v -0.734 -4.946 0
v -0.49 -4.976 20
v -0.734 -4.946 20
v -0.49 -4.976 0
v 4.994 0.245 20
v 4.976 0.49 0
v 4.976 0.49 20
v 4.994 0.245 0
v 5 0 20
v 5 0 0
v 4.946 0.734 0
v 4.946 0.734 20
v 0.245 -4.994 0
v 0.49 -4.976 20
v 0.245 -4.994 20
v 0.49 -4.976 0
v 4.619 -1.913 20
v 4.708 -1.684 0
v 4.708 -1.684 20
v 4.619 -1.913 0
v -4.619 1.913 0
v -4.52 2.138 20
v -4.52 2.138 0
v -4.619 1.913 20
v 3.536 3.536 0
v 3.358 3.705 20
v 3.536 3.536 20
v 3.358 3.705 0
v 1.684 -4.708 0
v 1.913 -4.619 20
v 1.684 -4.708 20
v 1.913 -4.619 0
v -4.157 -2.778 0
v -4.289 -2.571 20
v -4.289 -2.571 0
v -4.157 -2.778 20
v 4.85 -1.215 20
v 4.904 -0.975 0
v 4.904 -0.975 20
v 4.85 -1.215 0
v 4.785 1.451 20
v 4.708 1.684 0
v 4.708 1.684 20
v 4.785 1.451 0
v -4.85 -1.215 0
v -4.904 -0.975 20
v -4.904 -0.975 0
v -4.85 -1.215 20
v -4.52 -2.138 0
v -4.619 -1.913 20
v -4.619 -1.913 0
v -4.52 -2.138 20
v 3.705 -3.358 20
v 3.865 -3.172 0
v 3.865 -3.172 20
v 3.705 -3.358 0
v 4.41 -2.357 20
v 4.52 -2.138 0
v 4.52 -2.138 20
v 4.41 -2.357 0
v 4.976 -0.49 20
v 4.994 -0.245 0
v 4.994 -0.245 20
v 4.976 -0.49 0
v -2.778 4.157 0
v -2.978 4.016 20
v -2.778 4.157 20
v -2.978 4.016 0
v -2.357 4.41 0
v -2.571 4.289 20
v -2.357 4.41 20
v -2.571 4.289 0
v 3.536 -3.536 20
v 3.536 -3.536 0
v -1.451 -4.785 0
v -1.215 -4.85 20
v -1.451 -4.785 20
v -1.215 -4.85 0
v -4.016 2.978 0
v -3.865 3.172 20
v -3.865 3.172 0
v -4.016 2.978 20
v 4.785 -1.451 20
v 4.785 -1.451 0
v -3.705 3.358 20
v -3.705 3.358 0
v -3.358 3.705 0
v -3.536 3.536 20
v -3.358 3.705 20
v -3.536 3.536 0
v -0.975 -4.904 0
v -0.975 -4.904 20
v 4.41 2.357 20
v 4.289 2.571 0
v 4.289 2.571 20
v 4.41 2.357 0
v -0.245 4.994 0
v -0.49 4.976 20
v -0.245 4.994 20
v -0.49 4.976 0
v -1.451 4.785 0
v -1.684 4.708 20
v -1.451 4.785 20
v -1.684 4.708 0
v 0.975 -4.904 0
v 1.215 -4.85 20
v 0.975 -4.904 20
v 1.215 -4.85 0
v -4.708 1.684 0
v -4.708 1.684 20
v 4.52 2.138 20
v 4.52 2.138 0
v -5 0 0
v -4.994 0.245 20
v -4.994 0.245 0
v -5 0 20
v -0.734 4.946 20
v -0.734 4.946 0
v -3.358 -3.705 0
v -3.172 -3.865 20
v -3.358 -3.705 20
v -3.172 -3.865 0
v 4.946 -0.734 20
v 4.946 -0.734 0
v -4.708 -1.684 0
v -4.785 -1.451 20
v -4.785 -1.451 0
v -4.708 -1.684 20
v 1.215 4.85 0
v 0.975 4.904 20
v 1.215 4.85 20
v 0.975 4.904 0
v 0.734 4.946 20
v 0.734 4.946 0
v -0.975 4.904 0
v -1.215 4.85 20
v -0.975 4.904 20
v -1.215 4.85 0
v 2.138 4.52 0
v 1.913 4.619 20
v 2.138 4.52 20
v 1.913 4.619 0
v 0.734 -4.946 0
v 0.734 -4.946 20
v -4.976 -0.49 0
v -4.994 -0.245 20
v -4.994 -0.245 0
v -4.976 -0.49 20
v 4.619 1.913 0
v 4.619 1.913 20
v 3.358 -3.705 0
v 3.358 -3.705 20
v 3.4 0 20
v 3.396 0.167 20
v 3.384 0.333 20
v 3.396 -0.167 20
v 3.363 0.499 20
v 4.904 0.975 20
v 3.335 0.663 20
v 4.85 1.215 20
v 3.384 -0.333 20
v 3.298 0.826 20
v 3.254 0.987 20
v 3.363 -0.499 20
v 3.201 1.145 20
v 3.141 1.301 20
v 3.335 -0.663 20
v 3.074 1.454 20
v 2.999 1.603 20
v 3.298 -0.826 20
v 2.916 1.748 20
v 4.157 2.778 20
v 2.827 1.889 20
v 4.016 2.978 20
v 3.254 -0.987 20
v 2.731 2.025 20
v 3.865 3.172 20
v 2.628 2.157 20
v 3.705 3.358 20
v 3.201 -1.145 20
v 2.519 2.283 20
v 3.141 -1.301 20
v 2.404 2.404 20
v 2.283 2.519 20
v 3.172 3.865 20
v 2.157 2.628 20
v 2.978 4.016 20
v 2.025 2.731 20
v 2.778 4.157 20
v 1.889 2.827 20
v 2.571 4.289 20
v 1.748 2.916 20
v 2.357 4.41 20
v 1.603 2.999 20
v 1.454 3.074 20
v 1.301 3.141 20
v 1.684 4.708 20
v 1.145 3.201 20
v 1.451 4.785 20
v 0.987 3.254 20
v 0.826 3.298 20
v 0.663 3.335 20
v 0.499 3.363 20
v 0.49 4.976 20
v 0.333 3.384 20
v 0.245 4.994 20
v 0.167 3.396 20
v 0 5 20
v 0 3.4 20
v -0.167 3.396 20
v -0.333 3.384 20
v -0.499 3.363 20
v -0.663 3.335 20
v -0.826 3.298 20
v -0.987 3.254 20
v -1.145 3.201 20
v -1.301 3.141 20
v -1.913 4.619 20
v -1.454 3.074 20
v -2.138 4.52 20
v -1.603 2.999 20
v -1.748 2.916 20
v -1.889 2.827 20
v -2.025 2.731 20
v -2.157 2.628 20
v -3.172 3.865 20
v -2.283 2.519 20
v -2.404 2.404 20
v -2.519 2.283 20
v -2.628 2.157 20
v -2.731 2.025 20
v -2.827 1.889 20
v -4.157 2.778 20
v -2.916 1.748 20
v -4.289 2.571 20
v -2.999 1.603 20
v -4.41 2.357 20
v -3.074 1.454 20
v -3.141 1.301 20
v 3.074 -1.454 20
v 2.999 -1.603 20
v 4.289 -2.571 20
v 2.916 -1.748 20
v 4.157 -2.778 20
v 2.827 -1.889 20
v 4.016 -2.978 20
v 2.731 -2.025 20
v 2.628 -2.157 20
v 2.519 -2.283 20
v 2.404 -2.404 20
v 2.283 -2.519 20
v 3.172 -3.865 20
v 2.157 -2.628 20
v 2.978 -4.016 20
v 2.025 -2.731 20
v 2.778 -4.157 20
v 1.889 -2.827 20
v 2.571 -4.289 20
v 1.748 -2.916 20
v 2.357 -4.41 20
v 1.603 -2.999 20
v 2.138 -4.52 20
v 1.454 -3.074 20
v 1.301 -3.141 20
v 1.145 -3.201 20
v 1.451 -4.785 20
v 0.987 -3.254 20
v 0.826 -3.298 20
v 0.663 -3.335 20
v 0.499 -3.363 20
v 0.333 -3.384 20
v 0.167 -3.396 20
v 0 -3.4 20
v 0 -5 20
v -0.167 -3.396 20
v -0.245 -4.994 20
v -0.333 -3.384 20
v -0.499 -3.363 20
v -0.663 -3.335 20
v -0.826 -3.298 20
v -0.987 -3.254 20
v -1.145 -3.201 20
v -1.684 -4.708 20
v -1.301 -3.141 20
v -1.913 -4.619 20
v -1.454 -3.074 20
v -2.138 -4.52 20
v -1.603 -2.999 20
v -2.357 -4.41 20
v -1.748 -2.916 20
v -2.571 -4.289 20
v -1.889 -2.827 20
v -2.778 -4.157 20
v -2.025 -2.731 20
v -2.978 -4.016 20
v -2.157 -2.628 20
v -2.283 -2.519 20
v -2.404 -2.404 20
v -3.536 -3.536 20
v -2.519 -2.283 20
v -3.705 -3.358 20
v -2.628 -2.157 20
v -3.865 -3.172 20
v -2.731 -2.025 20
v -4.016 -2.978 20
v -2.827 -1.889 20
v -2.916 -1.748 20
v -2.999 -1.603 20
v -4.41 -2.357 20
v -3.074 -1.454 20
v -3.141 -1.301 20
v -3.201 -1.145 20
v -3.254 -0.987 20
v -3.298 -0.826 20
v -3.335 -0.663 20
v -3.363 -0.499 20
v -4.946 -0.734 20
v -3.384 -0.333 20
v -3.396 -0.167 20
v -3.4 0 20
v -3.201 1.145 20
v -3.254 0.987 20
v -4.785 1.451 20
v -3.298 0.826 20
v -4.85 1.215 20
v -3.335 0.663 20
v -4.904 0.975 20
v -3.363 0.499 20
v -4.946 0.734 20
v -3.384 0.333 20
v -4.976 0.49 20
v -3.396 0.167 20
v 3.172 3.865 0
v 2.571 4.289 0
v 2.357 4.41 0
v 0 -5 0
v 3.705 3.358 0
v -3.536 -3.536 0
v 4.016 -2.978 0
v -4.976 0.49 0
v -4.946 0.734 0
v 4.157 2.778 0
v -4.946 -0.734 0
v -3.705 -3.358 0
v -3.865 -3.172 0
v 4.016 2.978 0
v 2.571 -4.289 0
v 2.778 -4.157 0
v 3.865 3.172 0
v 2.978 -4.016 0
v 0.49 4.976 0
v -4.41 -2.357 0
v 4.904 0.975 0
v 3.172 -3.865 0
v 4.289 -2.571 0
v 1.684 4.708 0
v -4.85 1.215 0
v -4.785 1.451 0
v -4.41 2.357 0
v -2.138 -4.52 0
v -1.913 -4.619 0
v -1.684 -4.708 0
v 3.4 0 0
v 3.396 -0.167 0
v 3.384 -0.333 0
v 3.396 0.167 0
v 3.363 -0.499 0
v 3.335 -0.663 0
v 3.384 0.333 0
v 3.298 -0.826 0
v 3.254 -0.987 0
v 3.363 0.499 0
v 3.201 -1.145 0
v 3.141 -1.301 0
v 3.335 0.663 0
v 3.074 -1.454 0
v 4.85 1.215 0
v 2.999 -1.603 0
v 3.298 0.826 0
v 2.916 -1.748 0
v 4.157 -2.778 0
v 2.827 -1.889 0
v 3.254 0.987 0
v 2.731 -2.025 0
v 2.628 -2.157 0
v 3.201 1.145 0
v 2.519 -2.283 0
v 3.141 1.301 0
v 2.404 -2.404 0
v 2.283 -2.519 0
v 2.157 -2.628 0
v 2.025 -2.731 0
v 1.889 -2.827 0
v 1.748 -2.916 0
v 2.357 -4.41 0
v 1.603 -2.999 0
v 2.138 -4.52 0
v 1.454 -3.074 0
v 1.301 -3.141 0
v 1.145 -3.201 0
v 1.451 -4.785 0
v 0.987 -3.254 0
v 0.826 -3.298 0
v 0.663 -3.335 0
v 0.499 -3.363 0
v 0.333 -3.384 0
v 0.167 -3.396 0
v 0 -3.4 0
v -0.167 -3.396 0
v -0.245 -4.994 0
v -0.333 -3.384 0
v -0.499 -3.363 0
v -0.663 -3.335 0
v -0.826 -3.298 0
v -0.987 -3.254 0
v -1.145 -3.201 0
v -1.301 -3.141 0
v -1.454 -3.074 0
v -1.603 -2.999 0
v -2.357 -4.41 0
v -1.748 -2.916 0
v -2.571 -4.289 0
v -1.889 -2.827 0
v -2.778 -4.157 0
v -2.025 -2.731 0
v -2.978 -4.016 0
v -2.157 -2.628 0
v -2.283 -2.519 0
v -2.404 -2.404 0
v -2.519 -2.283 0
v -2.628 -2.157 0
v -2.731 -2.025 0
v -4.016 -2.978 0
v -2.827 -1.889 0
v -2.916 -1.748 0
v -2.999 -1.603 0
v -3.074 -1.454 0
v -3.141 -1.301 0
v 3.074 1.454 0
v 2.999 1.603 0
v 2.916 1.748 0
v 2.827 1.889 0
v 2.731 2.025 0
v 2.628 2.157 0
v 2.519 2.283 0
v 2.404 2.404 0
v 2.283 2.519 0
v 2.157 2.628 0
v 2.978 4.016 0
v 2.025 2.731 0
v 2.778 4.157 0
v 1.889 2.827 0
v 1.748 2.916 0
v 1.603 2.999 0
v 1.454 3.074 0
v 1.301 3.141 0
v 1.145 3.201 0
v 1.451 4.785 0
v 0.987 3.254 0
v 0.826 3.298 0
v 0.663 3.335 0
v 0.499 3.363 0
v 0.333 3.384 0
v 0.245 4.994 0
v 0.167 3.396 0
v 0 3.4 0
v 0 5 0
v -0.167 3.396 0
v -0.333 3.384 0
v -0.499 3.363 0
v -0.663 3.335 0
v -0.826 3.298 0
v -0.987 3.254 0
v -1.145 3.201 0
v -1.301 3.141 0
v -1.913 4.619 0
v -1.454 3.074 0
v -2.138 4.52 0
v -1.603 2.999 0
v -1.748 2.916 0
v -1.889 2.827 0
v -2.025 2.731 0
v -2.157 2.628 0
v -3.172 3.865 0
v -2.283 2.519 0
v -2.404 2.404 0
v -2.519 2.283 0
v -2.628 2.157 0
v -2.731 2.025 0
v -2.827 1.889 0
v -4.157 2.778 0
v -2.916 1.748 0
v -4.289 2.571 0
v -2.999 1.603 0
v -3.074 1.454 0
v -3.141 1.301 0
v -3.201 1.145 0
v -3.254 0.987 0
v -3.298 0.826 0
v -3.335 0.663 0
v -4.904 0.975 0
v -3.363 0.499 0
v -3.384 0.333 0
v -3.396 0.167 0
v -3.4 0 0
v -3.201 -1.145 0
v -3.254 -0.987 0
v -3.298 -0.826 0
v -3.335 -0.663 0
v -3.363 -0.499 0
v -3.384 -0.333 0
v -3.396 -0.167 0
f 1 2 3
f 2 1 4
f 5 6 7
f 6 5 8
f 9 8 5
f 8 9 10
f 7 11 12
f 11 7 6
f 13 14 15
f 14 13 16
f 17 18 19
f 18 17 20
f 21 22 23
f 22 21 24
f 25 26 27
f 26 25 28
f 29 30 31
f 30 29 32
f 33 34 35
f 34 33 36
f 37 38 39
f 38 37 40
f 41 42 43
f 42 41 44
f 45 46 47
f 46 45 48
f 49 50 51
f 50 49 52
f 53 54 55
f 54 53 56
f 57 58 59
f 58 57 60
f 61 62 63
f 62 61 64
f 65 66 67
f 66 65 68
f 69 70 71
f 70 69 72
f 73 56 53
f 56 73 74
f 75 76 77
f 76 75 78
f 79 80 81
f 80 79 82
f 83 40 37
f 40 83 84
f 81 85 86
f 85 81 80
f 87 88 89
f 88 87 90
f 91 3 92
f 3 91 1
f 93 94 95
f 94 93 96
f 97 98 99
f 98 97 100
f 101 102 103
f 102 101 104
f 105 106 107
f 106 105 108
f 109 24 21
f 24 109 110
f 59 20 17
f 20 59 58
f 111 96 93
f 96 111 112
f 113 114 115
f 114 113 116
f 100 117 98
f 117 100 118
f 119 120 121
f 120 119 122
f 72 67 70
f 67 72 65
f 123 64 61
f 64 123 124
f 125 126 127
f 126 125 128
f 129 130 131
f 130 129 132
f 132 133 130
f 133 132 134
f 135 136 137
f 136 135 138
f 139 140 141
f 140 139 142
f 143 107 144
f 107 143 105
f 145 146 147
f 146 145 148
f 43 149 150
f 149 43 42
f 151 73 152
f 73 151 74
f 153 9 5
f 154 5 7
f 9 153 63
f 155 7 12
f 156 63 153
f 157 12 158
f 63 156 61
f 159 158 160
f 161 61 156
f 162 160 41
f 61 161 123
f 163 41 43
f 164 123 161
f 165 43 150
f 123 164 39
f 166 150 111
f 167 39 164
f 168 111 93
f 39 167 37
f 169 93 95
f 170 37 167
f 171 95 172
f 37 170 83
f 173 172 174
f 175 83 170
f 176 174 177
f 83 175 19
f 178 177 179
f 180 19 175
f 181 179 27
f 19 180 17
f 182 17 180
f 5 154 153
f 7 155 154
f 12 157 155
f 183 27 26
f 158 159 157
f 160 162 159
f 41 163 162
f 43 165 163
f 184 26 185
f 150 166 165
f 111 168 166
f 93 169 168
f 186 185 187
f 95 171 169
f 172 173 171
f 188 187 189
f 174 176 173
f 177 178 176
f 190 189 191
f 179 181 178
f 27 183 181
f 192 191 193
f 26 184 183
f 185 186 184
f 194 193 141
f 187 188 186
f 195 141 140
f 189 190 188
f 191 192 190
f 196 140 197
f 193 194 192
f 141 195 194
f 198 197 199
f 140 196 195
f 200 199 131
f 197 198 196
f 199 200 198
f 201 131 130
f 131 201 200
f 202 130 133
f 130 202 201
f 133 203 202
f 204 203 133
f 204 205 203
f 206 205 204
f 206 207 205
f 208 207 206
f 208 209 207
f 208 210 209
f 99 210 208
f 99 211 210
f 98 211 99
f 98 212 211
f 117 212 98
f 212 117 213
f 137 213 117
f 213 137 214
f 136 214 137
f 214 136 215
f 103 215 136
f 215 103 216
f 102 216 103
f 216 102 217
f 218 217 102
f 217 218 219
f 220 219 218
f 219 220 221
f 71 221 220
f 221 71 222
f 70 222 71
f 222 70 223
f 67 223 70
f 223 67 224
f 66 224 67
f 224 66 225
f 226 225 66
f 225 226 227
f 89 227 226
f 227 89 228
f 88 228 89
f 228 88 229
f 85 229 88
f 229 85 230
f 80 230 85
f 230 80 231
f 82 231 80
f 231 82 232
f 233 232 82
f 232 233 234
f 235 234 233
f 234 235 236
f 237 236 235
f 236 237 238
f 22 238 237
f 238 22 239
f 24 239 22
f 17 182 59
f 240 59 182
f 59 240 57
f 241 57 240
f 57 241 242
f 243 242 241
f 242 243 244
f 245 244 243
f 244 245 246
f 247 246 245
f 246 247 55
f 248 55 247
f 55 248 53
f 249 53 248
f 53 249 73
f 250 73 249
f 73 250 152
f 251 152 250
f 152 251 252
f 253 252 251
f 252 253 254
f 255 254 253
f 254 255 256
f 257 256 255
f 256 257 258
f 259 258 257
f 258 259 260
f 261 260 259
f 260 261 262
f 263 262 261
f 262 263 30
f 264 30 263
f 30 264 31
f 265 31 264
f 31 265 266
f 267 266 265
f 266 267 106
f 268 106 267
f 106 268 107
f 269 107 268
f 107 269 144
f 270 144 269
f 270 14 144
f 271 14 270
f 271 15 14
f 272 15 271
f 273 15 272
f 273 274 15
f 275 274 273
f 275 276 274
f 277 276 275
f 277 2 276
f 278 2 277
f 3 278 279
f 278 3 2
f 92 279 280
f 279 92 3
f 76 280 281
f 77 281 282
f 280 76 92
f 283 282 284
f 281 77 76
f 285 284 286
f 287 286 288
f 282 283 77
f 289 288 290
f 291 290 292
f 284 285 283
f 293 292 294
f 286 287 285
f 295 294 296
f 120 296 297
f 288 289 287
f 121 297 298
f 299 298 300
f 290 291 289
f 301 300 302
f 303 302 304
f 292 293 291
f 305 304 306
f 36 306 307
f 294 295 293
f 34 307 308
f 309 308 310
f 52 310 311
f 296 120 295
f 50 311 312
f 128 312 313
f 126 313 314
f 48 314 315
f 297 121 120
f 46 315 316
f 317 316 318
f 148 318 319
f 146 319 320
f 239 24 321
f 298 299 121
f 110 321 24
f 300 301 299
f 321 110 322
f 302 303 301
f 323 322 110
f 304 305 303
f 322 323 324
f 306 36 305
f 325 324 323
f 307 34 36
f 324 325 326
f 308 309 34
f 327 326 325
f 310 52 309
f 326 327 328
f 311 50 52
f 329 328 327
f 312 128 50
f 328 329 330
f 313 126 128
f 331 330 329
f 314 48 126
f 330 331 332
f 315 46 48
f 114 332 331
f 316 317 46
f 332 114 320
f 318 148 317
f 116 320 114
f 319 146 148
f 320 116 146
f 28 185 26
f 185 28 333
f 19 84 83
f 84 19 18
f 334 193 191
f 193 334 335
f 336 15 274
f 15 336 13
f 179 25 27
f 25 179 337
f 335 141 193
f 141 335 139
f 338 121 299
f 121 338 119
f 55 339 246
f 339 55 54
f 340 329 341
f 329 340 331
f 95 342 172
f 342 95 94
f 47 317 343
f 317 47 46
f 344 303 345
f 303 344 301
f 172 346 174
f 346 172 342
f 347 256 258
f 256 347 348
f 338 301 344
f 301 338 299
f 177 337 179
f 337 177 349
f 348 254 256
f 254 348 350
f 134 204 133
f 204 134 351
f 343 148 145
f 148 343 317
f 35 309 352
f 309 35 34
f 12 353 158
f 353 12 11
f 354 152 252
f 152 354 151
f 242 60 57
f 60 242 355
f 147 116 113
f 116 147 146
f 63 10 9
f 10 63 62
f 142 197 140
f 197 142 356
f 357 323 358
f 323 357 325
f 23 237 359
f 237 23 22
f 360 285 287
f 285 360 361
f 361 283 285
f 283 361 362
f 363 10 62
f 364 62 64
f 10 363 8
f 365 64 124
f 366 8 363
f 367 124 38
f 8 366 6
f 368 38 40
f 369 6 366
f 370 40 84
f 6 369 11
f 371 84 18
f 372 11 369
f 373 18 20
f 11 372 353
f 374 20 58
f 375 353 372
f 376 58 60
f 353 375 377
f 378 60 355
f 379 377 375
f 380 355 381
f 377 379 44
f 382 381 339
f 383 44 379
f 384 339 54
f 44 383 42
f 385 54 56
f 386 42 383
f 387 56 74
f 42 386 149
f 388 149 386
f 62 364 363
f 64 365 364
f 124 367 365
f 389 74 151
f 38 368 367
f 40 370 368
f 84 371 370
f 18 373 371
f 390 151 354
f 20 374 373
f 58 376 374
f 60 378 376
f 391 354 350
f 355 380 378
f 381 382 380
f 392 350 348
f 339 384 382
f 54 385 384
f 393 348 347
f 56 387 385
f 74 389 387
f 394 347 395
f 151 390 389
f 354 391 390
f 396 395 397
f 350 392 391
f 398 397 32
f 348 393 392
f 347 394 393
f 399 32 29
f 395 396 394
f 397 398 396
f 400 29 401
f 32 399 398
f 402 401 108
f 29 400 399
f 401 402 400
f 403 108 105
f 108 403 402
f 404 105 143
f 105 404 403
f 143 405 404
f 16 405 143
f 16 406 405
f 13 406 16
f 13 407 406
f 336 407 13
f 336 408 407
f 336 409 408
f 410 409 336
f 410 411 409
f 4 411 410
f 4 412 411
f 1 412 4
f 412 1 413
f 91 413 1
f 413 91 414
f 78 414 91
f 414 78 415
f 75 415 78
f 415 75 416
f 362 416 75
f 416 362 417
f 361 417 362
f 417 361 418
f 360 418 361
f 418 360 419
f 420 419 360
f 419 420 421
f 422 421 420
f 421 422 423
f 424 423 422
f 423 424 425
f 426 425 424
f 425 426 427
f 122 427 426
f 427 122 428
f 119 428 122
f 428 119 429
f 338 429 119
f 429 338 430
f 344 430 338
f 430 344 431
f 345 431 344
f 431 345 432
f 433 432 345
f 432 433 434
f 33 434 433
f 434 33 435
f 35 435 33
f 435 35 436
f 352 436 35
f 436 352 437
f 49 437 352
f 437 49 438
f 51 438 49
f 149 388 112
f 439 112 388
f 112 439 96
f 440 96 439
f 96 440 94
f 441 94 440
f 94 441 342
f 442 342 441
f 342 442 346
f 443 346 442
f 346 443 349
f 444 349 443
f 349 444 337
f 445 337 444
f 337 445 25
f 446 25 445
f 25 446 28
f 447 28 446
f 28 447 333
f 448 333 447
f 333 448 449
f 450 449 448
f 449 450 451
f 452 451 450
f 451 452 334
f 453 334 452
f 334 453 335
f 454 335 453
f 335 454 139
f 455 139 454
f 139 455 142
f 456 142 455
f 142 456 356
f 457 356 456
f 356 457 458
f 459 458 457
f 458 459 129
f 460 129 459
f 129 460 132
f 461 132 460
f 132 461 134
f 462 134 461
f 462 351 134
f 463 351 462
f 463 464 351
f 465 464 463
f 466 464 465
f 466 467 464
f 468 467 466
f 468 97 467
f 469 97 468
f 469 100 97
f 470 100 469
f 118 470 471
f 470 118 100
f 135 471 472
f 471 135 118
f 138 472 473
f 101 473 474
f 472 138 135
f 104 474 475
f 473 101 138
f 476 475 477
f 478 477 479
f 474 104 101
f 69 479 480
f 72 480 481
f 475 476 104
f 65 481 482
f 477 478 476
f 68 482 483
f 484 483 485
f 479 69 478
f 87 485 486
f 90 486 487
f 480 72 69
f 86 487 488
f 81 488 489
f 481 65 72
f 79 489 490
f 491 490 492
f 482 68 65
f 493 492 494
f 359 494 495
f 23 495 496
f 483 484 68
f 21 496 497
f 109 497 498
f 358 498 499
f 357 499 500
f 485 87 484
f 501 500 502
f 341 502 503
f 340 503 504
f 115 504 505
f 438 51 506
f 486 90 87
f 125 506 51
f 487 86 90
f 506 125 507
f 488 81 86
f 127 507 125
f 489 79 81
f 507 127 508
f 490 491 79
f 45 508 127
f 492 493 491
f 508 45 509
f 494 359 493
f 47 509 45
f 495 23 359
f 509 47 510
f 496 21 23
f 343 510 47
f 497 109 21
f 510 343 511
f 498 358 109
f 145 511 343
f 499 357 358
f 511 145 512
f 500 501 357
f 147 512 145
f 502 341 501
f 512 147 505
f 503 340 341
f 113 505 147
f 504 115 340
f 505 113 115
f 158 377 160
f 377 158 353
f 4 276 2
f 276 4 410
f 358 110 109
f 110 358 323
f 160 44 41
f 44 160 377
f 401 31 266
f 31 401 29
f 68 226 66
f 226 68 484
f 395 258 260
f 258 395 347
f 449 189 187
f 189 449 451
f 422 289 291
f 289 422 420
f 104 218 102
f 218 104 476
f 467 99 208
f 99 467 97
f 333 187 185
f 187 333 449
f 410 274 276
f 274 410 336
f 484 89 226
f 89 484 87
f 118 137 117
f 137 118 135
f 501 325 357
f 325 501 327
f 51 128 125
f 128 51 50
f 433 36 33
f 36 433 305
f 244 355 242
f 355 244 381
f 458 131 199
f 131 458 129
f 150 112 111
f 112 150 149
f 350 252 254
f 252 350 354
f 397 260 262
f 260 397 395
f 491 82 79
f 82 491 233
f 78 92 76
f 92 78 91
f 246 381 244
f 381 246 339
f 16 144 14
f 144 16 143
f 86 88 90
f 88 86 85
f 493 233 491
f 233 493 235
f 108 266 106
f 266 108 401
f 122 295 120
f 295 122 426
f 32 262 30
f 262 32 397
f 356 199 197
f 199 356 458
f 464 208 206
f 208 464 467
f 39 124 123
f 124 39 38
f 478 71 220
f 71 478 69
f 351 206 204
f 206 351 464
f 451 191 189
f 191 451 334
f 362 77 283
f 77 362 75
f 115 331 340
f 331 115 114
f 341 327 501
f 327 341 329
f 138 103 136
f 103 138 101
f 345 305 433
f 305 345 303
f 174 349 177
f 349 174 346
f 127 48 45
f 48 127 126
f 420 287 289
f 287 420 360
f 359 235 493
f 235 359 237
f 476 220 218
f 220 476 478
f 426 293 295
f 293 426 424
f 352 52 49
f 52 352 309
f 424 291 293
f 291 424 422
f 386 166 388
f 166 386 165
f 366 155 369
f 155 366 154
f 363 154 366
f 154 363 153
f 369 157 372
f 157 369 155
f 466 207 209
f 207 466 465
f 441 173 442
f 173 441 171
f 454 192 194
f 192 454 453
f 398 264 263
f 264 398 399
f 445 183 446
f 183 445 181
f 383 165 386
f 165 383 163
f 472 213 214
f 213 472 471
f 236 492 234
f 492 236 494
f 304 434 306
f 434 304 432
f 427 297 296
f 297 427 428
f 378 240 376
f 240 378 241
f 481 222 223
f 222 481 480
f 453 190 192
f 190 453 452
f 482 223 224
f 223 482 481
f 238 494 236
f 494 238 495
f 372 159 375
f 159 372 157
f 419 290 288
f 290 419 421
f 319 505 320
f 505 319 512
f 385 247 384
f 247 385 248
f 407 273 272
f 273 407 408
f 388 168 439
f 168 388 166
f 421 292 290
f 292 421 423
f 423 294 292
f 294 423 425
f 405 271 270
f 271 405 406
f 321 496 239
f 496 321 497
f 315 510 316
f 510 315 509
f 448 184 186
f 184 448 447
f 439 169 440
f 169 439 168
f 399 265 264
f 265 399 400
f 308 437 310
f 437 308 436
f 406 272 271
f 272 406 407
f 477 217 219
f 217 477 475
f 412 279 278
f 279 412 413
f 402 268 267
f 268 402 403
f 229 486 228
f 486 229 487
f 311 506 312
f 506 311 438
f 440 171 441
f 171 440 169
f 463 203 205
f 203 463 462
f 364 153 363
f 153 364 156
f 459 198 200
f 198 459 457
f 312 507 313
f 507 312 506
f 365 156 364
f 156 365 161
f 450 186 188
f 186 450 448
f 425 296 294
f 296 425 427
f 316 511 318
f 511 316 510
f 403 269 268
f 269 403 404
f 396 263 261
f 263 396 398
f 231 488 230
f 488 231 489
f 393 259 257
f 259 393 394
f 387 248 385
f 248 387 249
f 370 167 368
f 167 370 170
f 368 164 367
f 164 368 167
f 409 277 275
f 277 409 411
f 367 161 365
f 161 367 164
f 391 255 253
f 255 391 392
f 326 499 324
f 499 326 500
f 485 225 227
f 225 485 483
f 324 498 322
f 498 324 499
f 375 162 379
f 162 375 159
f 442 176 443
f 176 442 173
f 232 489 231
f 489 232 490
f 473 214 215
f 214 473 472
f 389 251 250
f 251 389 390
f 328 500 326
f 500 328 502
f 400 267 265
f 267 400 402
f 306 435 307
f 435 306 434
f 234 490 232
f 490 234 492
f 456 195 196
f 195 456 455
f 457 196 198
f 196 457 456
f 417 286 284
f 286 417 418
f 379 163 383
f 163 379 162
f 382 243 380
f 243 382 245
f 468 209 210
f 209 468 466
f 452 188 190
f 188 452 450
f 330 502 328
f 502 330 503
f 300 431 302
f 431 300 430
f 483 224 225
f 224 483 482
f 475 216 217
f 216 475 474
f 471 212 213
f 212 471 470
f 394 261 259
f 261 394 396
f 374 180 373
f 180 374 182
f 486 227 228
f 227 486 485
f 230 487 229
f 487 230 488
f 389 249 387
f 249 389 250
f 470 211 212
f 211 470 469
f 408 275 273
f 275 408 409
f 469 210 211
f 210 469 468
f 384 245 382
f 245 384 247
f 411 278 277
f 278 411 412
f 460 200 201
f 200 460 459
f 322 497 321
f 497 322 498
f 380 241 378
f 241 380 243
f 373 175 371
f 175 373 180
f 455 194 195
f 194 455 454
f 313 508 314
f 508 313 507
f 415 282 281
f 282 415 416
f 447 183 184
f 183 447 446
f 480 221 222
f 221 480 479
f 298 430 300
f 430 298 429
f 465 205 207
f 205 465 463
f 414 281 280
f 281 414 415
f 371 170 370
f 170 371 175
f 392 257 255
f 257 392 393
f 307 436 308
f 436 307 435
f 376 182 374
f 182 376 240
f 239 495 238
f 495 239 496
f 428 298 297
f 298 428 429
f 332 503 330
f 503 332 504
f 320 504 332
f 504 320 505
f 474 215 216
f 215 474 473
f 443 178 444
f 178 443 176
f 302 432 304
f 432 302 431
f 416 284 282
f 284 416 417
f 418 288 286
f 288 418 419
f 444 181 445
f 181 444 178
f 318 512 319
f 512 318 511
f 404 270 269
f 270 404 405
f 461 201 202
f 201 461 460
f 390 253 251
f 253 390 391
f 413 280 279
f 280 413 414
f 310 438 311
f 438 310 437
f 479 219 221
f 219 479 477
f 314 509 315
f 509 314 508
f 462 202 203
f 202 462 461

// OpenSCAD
// Lab Funnel Design
// Units: millimetres
// Orientation: Upright, wide opening at top, rests on XY plane at z=0

// Dimensions
$fn = 128; // High resolution for smooth curves

// Spout (Tube)
spout_outer_diameter = 10;
spout_inner_diameter = 6.8;
spout_length = 20;
spout_wall_thickness = 1.6;

// Cone (Funnel)
cone_bottom_diameter = 10; // Matches spout outer diameter
cone_top_diameter = 60;
cone_height = 30; // From z=20 to z=50

// Wall Thickness (applies to cone as well)
wall_thickness = 1.6;

// Derived Cone Dimensions
cone_bottom_inner_diameter = cone_bottom_diameter - 2 * wall_thickness;
cone_top_inner_diameter = cone_top_diameter - 2 * wall_thickness;

// Build the part
// We construct the solid by creating the outer shell and subtracting the inner void.
// The part sits on the XY plane at z=0.

difference() {
    // --- OUTER SHELL ---
    union() {
        // 1. Spout Outer Cylinder (z=0 to z=20)
        cylinder(
            h = spout_length,
            d = spout_outer_diameter,
            center = false
        );

        // 2. Cone Outer Frustum (z=20 to z=50)
        // Translate to start at z=20
        translate([0, 0, spout_length]) {
            // Linear extrusion of a triangle profile rotated 90 deg around Y to form cone
            // Profile: Base at z=0 (relative) is cone_bottom_diameter, Top at z=cone_height is cone_top_diameter
            // We use linear_extrude with path = circle to create a cone, but simpler is rotate_extrude with a line segment.
            // Let's use rotate_extrude for the cone frustum.
            // Profile: A line from (cone_bottom_diameter/2, 0) to (cone_top_diameter/2, cone_height)
            rotate_extrude($fn = $fn) {
                // Draw the profile line
                // Start at bottom radius, go up to top radius
                // Note: rotate_extrude rotates around Z axis. We need to define the profile in XZ plane.
                // However, rotate_extrude expects the profile to be in the XZ plane (Y is the axis of rotation).
                // Wait, standard rotate_extrude rotates around Z.
                // To make a cone, we rotate a line segment around the Z axis.
                // The line segment goes from (radius_bottom, 0) to (radius_top, height).
                
                // Let's define the profile points
                // Point 1: (cone_bottom_diameter/2, 0)
                // Point 2: (cone_top_diameter/2, cone_height)
                // We need to draw this line.
                
                // Using polygon for the profile
                polygon([
                    [cone_bottom_diameter/2, 0],
                    [cone_top_diameter/2, cone_height]
                ]);
            }
        }
    }

    // --- INNER VOID ---
    // We subtract the inner volume to create the bore.
    // The void consists of the inner cylinder and the inner cone frustum.
    
    union() {
        // 1. Inner Cylinder Void (z=0 to z=20)
        cylinder(
            h = spout_length,
            d = spout_inner_diameter,
            center = false
        );

        // 2. Inner Cone Void (z=20 to z=50)
        translate([0, 0, spout_length]) {
            rotate_extrude($fn = $fn) {
                // Profile for inner cone
                // Start at bottom inner radius, go up to top inner radius
                polygon([
                    [cone_bottom_inner_diameter/2, 0],
                    [cone_top_inner_diameter/2, cone_height]
                ]);
            }
        }
    }
}
